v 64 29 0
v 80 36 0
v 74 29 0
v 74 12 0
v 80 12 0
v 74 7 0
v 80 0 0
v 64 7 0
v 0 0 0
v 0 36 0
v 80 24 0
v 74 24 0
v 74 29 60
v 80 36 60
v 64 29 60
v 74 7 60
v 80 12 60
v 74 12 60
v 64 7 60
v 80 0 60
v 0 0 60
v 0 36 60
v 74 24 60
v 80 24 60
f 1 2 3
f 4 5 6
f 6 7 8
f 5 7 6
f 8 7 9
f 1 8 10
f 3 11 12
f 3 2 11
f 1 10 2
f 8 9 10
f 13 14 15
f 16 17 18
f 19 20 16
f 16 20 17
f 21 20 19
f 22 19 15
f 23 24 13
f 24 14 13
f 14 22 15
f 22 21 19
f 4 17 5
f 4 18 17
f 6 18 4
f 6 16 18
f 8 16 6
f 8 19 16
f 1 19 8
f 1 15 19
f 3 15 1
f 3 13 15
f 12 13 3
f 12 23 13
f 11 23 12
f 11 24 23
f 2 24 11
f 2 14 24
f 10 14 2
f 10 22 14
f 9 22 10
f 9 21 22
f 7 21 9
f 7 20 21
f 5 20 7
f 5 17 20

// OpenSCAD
$fn = 32;

// ----------------------------------------------------------------------
// T-slot rail: 80 x 36 mm section, 60 mm long
// ----------------------------------------------------------------------

// --- parameters (mm) ---
profile_height = 60;      // extrusion height
profile_points = 12;      // points of the closed outline

profile = [[0, 0], [80, 0], [80, 12], [74, 12], [74, 7], [64, 7], [64, 29], [74, 29], [74, 24], [80, 24], [80, 36], [0, 36]];  // single closed polygon, 12 points, counter clockwise

// --- the one profile operation ---
linear_extrude(height = profile_height) polygon(points = profile);
